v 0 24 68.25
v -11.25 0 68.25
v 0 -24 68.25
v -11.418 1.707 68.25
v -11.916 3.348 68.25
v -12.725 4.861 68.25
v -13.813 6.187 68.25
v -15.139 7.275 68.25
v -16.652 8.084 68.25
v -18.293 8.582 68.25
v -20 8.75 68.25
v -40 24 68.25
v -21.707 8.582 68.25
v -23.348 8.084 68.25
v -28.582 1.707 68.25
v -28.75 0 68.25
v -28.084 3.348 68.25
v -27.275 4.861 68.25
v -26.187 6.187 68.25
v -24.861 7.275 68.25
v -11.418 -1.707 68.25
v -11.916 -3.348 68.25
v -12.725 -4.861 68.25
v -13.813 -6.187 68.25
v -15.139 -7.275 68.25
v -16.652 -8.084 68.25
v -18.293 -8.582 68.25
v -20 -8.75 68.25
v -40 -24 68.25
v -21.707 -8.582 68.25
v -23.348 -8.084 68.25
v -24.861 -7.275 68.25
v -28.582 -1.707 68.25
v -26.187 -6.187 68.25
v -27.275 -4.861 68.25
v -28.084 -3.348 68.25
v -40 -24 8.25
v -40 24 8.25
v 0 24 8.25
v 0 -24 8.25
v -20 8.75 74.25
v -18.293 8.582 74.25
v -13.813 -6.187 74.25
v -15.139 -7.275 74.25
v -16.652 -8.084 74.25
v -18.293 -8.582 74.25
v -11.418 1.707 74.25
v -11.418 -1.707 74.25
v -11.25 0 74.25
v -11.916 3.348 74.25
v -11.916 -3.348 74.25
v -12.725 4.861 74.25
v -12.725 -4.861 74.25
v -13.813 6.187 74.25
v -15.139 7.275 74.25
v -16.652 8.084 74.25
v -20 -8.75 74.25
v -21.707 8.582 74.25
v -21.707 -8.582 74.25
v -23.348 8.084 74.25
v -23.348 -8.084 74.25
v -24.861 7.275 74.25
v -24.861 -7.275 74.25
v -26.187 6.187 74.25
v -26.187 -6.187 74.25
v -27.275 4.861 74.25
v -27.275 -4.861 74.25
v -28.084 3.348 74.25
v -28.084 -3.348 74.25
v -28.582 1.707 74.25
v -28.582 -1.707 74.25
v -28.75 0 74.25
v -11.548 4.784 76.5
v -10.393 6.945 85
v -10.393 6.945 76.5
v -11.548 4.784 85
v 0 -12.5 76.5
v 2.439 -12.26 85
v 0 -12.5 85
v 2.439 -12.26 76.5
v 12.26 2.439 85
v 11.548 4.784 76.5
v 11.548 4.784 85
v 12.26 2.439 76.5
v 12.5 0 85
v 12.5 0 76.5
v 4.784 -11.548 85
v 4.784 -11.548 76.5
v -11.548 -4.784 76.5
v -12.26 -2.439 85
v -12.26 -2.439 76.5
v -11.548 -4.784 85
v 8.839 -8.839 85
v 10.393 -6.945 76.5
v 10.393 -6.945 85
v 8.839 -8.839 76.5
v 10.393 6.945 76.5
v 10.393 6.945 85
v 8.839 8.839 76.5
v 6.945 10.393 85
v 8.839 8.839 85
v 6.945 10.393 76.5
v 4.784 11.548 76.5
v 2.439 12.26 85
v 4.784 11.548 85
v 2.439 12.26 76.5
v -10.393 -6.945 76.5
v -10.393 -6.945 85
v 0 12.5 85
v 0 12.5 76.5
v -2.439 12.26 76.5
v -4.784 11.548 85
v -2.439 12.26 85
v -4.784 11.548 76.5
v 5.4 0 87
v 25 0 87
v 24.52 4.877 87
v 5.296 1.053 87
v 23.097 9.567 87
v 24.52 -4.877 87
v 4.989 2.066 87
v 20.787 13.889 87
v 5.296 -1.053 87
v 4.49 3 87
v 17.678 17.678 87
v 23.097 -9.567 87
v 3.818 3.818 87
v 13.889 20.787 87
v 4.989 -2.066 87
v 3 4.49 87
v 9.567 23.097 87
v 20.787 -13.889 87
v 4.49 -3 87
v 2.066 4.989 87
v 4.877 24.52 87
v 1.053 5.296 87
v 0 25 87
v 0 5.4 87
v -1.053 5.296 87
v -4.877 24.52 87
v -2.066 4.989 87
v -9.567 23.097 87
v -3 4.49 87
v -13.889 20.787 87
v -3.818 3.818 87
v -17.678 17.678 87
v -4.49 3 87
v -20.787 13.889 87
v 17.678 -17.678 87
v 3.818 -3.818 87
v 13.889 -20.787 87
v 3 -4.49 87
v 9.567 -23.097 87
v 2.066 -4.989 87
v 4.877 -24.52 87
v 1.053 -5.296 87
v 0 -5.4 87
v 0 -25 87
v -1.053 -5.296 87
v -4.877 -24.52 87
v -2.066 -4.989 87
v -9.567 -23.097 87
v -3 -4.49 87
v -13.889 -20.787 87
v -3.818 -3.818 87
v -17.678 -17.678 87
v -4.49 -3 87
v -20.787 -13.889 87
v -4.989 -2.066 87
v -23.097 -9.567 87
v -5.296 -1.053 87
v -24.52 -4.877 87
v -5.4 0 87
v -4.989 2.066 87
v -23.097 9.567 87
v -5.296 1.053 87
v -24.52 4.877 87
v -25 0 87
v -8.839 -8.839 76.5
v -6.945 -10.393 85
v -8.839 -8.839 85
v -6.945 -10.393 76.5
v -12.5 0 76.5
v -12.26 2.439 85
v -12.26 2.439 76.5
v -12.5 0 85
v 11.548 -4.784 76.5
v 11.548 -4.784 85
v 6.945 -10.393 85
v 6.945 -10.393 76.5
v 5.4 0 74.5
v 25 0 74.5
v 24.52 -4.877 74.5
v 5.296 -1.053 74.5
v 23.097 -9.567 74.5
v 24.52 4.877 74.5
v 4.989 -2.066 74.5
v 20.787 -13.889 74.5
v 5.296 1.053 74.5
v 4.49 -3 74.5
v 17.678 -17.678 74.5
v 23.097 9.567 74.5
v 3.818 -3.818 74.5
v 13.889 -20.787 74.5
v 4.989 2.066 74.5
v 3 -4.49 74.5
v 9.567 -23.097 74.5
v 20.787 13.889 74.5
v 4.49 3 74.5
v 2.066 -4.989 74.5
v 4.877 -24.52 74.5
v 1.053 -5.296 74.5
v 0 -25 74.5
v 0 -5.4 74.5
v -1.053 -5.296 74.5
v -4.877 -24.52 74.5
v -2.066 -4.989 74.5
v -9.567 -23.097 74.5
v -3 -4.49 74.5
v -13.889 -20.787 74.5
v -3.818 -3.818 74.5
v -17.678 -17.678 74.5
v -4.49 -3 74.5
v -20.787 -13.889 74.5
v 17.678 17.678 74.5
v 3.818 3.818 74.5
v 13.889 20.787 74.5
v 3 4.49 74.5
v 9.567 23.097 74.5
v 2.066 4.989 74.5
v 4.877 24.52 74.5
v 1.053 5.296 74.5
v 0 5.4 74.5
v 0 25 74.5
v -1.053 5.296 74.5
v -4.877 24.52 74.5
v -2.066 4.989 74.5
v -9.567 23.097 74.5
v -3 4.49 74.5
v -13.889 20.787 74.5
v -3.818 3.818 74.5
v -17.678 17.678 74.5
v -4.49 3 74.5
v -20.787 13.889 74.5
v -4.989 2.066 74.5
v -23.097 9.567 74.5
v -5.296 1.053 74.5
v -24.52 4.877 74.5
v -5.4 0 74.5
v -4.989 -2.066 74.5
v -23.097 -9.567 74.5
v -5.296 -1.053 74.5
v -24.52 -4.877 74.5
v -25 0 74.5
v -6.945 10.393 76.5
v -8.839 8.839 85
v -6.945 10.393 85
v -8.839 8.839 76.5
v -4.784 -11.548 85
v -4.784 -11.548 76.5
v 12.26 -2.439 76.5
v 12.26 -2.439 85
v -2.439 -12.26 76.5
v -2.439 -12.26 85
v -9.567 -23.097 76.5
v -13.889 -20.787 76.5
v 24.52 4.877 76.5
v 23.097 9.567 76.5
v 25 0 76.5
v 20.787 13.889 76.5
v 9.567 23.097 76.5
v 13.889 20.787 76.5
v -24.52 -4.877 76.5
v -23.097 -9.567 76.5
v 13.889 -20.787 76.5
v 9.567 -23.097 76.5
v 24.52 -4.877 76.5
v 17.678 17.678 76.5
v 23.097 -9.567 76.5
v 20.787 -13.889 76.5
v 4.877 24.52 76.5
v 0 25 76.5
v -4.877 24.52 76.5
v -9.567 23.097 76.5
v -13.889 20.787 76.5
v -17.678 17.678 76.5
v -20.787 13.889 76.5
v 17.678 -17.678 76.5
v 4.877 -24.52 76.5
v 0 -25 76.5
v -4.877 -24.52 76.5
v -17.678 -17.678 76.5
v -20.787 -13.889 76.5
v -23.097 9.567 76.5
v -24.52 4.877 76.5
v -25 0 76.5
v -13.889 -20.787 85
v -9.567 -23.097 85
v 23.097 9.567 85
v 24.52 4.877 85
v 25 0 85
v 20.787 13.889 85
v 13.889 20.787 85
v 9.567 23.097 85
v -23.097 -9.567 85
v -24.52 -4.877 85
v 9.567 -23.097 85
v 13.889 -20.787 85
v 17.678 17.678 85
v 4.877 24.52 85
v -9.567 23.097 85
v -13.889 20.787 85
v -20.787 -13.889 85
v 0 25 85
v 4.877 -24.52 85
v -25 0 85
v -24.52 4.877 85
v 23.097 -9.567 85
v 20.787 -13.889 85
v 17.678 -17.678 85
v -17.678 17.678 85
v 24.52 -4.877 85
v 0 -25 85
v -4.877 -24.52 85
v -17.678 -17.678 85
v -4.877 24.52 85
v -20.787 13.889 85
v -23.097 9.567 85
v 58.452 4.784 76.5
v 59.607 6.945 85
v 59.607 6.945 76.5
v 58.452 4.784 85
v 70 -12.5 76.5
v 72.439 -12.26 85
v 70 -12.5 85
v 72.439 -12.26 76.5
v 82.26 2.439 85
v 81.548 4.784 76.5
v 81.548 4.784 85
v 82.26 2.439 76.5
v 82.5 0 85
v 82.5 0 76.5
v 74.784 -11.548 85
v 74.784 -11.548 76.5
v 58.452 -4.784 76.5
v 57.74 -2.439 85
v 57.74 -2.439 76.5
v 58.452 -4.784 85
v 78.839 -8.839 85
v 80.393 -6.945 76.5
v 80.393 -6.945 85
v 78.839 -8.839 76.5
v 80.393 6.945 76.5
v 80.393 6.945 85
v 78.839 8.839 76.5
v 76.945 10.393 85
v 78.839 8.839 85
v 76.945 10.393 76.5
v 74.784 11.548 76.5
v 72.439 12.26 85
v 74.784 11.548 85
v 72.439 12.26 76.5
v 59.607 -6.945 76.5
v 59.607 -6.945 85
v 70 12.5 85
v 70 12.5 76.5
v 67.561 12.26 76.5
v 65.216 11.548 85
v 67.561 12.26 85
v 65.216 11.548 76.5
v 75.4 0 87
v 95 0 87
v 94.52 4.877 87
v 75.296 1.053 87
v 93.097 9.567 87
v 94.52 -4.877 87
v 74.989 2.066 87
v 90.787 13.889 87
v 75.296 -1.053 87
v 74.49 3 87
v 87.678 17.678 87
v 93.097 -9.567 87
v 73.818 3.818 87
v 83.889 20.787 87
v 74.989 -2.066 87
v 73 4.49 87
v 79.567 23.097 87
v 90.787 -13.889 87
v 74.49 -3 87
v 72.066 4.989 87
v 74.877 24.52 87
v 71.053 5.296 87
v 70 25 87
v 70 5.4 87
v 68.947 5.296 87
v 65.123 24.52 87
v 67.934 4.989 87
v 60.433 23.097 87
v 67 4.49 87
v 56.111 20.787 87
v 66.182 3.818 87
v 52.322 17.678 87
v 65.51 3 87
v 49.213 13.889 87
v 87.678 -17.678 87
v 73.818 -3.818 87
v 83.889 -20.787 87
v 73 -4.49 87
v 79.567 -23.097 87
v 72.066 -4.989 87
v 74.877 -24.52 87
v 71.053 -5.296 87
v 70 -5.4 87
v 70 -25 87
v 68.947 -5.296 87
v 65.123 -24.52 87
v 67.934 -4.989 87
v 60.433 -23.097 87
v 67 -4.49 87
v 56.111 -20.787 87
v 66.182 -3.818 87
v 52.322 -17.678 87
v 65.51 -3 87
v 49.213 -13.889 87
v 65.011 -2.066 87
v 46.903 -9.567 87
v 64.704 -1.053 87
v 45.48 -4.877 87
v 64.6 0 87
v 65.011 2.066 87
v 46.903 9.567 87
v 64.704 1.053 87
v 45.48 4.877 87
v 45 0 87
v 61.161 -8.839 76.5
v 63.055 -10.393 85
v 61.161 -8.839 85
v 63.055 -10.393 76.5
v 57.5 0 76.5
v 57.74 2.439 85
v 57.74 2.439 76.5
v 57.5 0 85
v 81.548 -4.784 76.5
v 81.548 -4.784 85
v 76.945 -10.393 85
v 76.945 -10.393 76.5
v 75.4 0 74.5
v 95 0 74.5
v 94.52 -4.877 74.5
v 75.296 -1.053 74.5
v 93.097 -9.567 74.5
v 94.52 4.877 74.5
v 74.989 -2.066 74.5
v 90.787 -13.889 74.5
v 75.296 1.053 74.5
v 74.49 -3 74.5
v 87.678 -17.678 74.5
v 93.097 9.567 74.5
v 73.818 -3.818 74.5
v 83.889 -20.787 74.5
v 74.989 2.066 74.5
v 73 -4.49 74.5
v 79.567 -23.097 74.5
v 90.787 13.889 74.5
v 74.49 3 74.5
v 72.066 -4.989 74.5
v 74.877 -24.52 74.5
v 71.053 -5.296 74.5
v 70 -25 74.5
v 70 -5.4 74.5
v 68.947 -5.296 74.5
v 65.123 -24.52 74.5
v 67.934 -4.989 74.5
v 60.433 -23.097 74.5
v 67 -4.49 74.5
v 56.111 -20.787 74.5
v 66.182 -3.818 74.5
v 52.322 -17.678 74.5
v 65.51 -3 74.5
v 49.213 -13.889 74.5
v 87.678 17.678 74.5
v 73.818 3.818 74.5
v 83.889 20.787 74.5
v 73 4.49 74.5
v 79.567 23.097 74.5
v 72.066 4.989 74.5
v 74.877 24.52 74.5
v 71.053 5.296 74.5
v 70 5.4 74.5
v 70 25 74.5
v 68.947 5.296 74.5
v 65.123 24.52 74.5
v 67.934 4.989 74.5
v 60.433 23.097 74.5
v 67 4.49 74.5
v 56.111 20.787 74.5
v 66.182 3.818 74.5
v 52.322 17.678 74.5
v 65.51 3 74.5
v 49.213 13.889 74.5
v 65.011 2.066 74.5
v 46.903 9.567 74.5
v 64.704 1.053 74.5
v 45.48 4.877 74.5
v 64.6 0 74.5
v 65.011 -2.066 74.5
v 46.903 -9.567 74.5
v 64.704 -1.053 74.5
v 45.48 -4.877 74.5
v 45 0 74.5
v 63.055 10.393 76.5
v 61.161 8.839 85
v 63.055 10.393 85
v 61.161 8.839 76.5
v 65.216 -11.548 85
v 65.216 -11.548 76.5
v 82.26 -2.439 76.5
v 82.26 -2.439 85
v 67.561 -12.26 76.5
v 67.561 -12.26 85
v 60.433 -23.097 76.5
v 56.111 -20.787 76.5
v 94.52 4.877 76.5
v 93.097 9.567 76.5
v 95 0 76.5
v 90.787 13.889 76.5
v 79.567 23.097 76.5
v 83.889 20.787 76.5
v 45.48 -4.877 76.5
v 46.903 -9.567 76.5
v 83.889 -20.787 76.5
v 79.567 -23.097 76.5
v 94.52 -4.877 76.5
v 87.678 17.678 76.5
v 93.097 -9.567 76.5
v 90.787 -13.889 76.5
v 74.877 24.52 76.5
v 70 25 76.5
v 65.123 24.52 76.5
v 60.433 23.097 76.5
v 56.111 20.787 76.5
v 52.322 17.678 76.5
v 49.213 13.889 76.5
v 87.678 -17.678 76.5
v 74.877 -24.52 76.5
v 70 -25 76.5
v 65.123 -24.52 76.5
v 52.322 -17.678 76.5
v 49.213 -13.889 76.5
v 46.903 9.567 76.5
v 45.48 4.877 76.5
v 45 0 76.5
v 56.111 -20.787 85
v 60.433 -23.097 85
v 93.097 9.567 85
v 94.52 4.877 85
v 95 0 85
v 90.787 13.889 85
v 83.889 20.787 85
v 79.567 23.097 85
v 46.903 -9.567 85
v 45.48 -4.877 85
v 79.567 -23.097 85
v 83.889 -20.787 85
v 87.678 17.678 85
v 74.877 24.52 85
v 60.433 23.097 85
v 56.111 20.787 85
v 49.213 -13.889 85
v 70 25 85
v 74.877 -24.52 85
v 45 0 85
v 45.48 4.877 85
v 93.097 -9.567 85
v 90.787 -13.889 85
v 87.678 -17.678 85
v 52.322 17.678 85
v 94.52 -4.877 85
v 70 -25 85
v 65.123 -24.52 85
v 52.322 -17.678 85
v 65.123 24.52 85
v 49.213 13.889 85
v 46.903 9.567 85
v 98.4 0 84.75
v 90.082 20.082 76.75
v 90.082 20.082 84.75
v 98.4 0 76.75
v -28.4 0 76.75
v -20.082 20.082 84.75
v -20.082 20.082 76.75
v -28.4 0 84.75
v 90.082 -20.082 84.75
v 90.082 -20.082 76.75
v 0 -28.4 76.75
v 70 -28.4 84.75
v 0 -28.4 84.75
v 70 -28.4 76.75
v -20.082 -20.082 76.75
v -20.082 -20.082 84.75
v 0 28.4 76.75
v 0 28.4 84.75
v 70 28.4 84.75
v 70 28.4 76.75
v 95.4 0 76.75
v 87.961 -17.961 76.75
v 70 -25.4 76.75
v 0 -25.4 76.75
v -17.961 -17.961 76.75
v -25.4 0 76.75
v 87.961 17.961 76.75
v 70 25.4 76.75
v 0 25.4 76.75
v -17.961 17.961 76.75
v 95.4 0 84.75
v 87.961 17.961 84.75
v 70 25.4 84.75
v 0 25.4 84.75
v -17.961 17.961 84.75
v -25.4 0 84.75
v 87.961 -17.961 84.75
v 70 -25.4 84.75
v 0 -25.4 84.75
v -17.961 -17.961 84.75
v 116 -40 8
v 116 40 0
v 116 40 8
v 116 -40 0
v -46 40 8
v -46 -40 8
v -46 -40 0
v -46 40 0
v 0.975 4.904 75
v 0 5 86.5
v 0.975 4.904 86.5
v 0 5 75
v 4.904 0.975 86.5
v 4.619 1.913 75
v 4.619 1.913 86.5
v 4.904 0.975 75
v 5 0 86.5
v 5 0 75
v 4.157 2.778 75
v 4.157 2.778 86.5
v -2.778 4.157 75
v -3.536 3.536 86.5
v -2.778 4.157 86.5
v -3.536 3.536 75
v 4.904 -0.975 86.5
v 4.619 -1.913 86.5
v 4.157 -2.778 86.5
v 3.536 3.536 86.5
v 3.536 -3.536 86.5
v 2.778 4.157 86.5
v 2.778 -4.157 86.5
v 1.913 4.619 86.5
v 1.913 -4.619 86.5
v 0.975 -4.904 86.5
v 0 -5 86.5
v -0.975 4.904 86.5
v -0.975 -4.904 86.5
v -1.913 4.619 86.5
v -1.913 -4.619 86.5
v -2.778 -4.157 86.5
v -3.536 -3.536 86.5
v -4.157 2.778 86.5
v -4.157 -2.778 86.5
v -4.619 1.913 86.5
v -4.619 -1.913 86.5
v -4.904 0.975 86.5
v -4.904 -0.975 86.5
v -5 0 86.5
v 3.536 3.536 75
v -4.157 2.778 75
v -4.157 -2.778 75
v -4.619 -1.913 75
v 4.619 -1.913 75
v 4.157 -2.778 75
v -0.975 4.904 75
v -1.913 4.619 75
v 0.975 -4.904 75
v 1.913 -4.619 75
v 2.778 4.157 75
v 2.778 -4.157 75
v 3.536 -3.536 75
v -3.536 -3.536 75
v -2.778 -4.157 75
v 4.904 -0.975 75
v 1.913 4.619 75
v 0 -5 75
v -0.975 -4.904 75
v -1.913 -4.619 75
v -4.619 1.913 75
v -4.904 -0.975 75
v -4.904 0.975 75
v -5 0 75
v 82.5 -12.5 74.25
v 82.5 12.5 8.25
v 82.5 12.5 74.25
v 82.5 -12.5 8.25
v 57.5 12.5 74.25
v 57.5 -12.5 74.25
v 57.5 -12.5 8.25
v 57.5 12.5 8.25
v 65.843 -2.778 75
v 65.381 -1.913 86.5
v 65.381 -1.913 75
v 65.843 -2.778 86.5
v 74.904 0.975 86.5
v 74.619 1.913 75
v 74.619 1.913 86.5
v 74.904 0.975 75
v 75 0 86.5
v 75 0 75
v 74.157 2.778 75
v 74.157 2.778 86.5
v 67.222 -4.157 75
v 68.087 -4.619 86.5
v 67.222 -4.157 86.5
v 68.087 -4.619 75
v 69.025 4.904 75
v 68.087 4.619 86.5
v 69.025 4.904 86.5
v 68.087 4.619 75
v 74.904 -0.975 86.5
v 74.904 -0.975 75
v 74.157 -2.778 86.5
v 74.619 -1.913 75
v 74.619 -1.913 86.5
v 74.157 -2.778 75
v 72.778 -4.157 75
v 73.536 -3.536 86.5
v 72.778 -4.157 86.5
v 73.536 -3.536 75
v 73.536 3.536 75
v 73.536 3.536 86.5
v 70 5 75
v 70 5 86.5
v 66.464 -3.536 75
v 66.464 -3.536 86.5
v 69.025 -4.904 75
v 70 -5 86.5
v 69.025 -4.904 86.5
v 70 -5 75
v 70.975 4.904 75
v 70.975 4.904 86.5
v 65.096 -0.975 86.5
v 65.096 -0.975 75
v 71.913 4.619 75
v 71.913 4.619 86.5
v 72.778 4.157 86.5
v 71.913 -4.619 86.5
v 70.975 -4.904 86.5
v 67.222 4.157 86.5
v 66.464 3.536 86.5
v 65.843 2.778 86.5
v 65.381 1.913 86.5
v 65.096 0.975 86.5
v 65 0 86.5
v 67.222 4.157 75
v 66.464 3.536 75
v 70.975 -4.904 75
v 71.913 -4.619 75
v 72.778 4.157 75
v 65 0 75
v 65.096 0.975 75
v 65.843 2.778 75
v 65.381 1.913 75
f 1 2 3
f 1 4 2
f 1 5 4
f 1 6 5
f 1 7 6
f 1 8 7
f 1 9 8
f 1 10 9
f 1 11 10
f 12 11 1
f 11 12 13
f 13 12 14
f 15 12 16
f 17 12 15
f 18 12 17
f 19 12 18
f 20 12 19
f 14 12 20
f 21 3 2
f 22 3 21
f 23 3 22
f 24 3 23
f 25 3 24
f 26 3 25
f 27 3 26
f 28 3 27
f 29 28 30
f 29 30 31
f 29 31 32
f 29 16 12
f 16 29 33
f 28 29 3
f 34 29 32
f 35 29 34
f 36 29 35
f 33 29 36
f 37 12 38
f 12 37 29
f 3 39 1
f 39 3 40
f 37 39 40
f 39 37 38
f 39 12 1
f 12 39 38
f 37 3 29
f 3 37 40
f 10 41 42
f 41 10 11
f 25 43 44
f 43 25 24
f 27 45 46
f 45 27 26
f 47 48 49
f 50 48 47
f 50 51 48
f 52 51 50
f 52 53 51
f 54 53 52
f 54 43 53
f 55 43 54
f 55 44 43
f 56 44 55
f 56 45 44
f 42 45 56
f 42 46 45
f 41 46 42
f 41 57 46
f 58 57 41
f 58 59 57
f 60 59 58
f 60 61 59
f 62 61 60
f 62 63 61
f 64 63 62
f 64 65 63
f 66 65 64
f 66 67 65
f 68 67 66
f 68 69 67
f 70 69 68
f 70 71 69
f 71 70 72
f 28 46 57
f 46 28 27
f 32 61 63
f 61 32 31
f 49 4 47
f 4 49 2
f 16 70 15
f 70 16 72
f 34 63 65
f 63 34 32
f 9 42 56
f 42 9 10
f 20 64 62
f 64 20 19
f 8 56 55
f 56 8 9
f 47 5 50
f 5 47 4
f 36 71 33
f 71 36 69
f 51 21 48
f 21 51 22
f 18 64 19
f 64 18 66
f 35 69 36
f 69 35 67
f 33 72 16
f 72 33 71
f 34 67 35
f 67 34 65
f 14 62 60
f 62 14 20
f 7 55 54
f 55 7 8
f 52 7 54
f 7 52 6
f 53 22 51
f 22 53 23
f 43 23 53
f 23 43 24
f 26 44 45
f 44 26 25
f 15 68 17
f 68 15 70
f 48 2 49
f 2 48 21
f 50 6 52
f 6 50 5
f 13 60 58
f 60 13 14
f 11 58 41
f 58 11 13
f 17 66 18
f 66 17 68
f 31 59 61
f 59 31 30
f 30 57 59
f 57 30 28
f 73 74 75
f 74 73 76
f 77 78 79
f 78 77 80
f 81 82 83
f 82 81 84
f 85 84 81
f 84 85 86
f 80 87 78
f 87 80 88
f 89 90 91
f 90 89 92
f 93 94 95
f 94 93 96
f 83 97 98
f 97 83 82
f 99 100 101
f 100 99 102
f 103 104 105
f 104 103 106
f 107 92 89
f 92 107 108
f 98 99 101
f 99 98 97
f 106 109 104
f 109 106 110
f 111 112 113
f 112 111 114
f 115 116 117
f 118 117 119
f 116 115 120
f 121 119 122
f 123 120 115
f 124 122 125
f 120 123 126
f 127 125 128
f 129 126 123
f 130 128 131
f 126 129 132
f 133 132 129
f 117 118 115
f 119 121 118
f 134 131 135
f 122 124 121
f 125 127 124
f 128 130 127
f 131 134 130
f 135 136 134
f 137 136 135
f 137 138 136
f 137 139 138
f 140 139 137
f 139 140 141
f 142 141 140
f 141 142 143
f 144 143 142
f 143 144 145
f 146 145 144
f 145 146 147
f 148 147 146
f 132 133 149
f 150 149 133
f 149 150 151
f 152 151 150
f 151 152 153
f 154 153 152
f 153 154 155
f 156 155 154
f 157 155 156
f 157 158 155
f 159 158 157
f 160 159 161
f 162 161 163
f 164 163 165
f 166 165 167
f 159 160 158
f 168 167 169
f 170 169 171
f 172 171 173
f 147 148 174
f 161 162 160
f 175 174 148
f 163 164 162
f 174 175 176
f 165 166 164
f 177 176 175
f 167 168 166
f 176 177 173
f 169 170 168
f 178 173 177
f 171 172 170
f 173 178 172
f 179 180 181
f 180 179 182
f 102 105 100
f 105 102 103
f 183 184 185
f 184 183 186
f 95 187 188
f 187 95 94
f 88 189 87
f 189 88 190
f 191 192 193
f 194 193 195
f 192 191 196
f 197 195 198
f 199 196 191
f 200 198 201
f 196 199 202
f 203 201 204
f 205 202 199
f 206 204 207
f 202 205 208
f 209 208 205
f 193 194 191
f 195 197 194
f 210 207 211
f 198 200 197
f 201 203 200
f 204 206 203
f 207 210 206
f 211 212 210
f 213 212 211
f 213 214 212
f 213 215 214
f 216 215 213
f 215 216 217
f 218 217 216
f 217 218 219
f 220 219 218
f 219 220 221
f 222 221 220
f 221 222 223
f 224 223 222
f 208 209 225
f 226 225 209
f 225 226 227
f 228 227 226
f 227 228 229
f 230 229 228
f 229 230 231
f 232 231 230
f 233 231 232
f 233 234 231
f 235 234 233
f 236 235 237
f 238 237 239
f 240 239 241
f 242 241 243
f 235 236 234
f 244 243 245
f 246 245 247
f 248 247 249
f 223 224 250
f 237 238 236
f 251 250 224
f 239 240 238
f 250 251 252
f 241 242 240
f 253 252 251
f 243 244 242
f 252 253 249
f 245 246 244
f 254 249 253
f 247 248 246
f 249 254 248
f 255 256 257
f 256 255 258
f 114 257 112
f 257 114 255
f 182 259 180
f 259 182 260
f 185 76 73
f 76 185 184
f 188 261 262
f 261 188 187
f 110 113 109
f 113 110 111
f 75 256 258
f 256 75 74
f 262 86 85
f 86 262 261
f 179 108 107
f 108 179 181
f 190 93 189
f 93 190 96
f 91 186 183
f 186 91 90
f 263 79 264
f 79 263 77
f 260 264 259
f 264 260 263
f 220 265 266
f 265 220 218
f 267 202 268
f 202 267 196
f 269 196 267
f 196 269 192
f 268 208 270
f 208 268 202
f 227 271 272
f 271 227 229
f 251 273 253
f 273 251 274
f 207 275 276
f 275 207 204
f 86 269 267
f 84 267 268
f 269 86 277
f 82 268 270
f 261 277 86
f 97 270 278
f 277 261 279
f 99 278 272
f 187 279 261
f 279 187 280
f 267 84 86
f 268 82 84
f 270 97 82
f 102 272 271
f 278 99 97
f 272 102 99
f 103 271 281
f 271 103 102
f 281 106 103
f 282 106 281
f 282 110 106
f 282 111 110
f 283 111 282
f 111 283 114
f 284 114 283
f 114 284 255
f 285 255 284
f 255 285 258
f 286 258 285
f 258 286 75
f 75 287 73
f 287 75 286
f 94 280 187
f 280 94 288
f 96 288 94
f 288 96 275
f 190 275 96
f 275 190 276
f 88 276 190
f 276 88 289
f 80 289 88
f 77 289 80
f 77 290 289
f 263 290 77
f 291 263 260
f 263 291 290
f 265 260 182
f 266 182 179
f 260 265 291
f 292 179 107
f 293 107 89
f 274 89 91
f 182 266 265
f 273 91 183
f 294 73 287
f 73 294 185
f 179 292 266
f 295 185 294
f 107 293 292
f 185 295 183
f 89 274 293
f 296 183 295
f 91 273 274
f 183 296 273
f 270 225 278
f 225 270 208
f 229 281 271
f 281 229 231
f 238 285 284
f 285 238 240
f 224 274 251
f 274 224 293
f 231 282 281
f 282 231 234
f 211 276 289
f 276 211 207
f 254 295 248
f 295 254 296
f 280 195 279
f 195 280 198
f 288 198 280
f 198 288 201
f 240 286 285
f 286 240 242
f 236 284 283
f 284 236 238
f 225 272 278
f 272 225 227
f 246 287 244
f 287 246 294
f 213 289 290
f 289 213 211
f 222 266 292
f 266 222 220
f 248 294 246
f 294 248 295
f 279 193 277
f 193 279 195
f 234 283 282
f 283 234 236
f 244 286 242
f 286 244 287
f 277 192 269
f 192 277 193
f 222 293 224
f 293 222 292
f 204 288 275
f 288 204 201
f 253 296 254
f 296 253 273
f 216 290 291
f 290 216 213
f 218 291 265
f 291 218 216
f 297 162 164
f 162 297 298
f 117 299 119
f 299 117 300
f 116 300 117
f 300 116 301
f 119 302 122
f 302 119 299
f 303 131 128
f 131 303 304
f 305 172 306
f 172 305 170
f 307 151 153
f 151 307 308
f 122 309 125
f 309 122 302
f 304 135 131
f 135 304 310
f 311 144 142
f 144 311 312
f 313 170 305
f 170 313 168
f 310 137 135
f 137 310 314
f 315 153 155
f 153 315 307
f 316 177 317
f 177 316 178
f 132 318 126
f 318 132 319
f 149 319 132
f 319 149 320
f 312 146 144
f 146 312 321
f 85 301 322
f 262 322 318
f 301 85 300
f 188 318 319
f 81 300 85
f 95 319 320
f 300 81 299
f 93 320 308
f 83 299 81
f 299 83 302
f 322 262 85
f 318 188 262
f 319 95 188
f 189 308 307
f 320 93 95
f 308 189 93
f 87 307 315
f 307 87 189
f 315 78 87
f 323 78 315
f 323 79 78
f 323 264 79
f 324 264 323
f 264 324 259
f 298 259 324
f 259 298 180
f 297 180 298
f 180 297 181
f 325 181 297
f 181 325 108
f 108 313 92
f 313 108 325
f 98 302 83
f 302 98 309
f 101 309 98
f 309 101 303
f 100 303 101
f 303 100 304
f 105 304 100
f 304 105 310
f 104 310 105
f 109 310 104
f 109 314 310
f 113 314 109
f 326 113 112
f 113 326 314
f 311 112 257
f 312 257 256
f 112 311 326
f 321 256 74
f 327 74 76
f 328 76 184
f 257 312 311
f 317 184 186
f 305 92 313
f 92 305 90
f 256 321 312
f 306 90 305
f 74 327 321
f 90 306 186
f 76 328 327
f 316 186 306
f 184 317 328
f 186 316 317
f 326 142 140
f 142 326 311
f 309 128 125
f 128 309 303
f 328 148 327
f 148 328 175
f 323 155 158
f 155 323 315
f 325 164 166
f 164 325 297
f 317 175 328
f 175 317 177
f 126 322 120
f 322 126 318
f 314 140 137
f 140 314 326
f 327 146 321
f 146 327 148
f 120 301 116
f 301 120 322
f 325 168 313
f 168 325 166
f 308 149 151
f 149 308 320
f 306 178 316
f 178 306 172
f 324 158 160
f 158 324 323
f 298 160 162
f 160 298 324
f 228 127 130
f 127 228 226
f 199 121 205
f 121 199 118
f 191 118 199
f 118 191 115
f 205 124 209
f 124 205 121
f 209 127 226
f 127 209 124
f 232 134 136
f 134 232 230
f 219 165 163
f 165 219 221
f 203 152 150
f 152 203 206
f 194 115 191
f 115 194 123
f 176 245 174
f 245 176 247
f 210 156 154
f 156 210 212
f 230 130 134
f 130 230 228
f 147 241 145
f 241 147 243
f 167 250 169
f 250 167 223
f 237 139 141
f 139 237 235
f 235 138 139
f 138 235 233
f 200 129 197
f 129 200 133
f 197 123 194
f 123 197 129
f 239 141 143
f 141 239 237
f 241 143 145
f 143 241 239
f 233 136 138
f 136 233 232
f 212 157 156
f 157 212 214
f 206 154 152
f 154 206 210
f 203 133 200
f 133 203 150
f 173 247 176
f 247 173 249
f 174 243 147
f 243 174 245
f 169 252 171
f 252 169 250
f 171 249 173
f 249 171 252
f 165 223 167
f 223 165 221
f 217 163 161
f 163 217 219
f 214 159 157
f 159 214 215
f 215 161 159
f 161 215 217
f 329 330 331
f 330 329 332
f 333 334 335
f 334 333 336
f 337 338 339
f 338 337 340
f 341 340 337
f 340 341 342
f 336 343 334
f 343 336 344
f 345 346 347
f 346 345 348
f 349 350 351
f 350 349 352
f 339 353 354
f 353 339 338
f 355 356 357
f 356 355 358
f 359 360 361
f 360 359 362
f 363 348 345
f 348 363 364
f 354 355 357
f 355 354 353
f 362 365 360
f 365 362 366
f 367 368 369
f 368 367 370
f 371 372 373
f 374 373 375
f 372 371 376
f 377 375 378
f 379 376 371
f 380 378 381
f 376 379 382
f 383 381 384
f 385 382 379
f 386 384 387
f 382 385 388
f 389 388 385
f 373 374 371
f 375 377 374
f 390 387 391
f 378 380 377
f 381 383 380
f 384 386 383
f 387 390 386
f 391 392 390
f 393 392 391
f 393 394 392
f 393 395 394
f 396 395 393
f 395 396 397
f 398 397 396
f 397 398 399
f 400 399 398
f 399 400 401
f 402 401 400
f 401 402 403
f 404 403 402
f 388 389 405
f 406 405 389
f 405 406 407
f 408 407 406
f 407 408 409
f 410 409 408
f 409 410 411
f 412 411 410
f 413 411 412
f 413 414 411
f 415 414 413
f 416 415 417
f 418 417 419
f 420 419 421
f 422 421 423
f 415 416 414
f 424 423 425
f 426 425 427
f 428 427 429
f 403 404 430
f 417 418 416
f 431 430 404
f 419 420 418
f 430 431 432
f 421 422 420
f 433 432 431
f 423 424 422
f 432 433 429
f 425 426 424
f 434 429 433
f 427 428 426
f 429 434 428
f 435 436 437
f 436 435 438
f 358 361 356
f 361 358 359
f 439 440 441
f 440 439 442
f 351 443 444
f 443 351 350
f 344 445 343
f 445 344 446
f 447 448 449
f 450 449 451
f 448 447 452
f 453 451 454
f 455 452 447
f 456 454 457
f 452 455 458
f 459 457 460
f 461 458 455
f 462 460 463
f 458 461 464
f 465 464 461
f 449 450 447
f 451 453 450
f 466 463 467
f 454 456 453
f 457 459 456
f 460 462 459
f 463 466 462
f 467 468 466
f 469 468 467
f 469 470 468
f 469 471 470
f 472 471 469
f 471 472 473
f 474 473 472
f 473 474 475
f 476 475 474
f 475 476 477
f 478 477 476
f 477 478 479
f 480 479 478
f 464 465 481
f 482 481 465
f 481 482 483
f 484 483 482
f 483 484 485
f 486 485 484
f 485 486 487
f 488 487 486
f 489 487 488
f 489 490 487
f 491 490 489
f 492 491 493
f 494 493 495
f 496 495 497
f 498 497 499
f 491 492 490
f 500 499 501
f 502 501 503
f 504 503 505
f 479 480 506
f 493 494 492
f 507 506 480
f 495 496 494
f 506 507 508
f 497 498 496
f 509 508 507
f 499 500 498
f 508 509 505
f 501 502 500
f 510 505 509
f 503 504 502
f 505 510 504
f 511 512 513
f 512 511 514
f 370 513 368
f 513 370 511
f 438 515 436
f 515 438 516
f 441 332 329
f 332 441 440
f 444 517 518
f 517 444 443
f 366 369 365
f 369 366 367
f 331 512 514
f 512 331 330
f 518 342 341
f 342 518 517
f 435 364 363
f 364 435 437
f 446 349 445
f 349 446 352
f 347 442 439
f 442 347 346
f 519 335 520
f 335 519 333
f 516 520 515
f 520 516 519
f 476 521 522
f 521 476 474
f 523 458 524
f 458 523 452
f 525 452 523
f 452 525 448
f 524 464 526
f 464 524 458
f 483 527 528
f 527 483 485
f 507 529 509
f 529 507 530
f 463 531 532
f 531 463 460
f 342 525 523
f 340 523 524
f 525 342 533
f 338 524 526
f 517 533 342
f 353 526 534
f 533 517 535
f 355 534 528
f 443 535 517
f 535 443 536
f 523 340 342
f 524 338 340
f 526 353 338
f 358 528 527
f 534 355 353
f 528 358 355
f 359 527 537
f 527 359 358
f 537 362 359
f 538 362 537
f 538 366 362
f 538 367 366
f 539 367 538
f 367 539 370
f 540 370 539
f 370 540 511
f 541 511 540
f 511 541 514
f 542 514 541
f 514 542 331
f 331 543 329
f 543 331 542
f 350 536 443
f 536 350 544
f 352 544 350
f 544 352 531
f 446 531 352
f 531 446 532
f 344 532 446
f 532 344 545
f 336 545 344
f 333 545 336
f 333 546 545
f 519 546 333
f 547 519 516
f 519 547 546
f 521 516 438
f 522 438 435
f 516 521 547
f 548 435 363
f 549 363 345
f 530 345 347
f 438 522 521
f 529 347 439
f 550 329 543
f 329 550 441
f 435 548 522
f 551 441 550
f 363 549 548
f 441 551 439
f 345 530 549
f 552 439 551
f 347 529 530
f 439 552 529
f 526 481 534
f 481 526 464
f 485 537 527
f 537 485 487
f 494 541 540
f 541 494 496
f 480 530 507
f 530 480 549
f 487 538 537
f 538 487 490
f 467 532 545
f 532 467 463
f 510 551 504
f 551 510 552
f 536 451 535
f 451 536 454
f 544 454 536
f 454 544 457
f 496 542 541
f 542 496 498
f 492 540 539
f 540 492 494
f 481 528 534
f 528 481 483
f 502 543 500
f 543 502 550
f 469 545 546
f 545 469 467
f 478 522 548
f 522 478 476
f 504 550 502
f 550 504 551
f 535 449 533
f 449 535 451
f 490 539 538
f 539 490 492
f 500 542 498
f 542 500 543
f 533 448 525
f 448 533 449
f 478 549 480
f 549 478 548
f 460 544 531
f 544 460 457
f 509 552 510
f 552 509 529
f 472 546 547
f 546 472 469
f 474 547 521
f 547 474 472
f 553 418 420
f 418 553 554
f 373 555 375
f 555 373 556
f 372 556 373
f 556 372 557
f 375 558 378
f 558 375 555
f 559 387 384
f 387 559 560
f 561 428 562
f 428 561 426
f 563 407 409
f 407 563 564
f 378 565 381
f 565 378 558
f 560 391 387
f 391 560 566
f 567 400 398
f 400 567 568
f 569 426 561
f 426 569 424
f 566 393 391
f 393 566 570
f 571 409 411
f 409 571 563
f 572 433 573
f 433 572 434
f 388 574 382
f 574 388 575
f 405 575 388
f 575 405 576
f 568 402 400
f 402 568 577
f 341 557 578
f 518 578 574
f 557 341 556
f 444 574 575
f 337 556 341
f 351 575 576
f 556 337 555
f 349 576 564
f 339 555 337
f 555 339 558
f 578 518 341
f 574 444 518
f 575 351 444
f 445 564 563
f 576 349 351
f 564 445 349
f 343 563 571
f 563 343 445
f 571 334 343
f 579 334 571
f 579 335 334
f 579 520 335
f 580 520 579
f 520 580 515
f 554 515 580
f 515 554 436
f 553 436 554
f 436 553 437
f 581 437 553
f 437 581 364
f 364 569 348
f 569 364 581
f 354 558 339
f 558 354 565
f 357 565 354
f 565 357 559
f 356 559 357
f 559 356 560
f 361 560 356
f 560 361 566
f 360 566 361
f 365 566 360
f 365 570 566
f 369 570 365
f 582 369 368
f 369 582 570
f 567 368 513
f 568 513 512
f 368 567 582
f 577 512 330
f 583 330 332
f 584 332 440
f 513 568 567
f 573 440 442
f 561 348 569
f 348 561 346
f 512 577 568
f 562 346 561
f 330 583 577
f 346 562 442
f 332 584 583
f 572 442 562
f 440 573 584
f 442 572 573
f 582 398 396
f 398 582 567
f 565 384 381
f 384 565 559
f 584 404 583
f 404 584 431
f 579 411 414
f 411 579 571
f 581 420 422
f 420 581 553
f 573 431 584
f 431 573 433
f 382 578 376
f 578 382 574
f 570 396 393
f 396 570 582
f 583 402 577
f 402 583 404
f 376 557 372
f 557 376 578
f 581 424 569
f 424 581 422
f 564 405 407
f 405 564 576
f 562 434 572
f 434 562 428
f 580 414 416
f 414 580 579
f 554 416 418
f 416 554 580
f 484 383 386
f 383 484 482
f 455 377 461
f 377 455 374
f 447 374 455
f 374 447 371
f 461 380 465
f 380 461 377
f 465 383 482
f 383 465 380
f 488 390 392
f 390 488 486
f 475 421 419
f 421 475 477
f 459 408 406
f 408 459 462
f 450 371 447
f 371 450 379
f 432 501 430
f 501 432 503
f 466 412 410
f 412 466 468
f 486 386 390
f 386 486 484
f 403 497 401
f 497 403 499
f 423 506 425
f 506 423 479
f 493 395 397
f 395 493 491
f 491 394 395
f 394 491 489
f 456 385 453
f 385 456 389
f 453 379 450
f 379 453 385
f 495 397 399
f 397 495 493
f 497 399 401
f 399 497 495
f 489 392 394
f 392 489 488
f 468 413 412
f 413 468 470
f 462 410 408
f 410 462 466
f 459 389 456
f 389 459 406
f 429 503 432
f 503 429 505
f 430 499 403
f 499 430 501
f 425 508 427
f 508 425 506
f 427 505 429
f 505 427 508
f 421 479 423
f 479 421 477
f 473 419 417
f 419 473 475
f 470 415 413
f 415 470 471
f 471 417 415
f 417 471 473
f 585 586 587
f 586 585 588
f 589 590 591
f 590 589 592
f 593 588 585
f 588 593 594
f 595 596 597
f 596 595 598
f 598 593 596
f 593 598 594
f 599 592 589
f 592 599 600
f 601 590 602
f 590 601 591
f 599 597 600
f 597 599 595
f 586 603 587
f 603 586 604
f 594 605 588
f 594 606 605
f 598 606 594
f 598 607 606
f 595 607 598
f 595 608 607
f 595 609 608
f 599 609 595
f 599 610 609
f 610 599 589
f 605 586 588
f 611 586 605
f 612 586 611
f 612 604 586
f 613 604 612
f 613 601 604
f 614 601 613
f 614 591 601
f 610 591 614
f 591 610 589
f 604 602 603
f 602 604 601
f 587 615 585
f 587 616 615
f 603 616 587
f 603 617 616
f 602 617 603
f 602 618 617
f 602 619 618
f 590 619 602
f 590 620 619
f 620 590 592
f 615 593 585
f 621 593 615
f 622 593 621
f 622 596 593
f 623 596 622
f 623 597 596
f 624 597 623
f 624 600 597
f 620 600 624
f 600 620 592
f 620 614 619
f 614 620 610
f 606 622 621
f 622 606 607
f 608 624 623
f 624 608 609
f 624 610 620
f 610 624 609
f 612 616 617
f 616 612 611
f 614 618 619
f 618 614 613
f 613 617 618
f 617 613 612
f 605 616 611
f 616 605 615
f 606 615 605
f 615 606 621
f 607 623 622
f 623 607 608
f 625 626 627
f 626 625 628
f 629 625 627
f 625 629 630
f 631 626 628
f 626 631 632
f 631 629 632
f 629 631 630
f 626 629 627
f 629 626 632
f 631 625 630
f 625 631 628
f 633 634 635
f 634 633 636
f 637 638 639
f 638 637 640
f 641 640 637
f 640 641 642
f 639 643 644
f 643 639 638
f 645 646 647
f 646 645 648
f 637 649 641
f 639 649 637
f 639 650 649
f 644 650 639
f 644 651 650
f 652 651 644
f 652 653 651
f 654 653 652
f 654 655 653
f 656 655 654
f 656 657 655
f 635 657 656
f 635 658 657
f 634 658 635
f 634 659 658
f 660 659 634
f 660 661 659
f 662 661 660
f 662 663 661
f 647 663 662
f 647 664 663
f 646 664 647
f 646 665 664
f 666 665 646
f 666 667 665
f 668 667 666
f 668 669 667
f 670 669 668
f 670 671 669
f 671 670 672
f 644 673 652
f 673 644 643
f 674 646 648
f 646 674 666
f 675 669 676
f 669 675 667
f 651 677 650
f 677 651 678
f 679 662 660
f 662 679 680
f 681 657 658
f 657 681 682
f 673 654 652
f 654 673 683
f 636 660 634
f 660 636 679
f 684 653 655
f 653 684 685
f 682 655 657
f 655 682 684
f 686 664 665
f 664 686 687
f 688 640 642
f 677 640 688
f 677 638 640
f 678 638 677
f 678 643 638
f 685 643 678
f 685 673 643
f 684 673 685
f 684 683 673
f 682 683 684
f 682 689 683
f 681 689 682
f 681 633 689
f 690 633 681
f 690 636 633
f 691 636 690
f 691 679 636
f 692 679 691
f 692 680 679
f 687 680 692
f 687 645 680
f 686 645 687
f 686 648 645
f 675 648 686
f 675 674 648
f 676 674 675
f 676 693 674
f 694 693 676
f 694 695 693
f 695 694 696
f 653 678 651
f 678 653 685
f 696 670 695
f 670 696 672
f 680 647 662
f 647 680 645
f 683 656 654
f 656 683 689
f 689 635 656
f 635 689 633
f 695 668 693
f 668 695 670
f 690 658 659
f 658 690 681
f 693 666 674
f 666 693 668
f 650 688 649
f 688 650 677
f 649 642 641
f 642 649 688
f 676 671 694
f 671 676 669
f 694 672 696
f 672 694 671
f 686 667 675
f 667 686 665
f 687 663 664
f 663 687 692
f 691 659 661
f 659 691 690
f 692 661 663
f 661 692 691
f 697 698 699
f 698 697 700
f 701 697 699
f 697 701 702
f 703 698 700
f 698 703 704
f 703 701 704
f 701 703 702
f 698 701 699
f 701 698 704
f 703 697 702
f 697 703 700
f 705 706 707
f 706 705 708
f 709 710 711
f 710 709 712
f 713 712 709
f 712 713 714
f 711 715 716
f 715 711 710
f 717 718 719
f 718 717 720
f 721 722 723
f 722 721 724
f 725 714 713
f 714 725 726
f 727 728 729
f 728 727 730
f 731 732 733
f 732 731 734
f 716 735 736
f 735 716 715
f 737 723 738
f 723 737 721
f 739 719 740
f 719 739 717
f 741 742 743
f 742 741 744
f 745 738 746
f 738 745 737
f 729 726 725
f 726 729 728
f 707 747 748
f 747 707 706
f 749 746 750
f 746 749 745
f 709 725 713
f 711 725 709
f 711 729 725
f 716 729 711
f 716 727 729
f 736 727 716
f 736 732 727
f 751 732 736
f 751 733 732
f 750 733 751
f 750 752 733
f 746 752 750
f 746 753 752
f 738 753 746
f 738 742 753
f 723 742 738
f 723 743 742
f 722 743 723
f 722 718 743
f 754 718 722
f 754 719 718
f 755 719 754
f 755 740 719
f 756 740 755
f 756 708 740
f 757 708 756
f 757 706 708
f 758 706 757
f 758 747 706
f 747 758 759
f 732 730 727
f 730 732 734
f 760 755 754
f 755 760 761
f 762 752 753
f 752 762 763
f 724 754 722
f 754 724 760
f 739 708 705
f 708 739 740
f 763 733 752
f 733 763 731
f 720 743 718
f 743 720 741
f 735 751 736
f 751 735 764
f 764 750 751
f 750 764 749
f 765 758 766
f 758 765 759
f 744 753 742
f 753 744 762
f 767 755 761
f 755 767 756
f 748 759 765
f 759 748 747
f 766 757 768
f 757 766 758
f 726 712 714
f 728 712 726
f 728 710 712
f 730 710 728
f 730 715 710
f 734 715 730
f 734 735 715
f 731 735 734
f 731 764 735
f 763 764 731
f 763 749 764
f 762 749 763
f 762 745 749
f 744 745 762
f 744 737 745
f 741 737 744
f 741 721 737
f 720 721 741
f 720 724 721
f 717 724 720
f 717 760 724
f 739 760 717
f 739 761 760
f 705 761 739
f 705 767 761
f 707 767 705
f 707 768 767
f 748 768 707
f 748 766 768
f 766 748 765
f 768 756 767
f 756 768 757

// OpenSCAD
$fn = 32;

// ------------------------------------------------------------------------
// Motor belt drive: span 70 mm, pulleys d50, belt 8 mm wide
// Every part is its own module, assembly() places every instance.
// ------------------------------------------------------------------------

// --- part 1 ---
module base_plate() {
  difference() {
    translate([-81, -40, 0]) cube([162, 80, 8]);
  }
}

// --- part 2 ---
module motor() {
  union() {
    translate([-30, -24, 0]) cube([60, 48, 40]);
    translate([33, 0, 20]) rotate([0, 90, 0]) cylinder(h = 6, d = 17.5, center = true);
  }
}

// --- part 3 ---
module drive_shaft() {
  translate([0, 0, -5.75]) cylinder(h = 11.5, d = 10);
}

// --- part 4 ---
module pulley_drive() {
  difference() {
    union() {
      cylinder(h = 12.5, d = 25);
      cylinder(h = 2, d = 50);
      translate([0, 0, 10.5]) cylinder(h = 2, d = 50);
    }
    translate([0, 0, -1]) cylinder(h = 14.5, d = 10.8);
  }
}

// --- part 5 ---
module idler_post() {
  translate([-12.5, -12.5, 0]) cube([25, 25, 66]);
}

// --- part 6 ---
module driven_shaft() {
  translate([0, 0, -5.75]) cylinder(h = 11.5, d = 10);
}

// --- part 7 ---
module pulley_driven() {
  difference() {
    union() {
      cylinder(h = 12.5, d = 25);
      cylinder(h = 2, d = 50);
      translate([0, 0, 10.5]) cylinder(h = 2, d = 50);
    }
    translate([0, 0, -1]) cylinder(h = 14.5, d = 10.8);
  }
}

// --- part 8 ---
module drive_belt() {
  difference() {
    linear_extrude(height = 8) polygon(points = concat([for (a = [90 : 45 : 270]) [28.4 * cos(a), 28.4 * sin(a)]], [for (a = [270 : 45 : 450]) [70 + 28.4 * cos(a), 28.4 * sin(a)]]));
    translate([0, 0, -1]) linear_extrude(height = 10) polygon(points = concat([for (a = [90 : 45 : 270]) [25.4 * cos(a), 25.4 * sin(a)]], [for (a = [270 : 45 : 450]) [70 + 25.4 * cos(a), 25.4 * sin(a)]]));
  }
}

// --- assembly ---
module assembly() {
  color([0.80, 0.24, 0.20]) translate([35, 0, 0]) rotate([0, 0, 0]) base_plate();
  color([0.20, 0.45, 0.75]) translate([0, 0, 38.25]) rotate([0, 270, 0]) motor();
  color([0.25, 0.62, 0.32]) translate([0, 0, 80.75]) rotate([0, 0, 0]) drive_shaft();
  color([0.92, 0.70, 0.18]) translate([0, 0, 74.5]) rotate([0, 0, 0]) pulley_drive();
  color([0.58, 0.35, 0.70]) translate([70, 0, 8.25]) rotate([0, 0, 0]) idler_post();
  color([0.16, 0.66, 0.66]) translate([70, 0, 80.75]) rotate([0, 0, 0]) driven_shaft();
  color([0.85, 0.48, 0.18]) translate([70, 0, 74.5]) rotate([0, 0, 0]) pulley_driven();
  color([0.55, 0.60, 0.65]) translate([0, 0, 76.75]) rotate([0, 0, 0]) drive_belt();
}

assembly();
